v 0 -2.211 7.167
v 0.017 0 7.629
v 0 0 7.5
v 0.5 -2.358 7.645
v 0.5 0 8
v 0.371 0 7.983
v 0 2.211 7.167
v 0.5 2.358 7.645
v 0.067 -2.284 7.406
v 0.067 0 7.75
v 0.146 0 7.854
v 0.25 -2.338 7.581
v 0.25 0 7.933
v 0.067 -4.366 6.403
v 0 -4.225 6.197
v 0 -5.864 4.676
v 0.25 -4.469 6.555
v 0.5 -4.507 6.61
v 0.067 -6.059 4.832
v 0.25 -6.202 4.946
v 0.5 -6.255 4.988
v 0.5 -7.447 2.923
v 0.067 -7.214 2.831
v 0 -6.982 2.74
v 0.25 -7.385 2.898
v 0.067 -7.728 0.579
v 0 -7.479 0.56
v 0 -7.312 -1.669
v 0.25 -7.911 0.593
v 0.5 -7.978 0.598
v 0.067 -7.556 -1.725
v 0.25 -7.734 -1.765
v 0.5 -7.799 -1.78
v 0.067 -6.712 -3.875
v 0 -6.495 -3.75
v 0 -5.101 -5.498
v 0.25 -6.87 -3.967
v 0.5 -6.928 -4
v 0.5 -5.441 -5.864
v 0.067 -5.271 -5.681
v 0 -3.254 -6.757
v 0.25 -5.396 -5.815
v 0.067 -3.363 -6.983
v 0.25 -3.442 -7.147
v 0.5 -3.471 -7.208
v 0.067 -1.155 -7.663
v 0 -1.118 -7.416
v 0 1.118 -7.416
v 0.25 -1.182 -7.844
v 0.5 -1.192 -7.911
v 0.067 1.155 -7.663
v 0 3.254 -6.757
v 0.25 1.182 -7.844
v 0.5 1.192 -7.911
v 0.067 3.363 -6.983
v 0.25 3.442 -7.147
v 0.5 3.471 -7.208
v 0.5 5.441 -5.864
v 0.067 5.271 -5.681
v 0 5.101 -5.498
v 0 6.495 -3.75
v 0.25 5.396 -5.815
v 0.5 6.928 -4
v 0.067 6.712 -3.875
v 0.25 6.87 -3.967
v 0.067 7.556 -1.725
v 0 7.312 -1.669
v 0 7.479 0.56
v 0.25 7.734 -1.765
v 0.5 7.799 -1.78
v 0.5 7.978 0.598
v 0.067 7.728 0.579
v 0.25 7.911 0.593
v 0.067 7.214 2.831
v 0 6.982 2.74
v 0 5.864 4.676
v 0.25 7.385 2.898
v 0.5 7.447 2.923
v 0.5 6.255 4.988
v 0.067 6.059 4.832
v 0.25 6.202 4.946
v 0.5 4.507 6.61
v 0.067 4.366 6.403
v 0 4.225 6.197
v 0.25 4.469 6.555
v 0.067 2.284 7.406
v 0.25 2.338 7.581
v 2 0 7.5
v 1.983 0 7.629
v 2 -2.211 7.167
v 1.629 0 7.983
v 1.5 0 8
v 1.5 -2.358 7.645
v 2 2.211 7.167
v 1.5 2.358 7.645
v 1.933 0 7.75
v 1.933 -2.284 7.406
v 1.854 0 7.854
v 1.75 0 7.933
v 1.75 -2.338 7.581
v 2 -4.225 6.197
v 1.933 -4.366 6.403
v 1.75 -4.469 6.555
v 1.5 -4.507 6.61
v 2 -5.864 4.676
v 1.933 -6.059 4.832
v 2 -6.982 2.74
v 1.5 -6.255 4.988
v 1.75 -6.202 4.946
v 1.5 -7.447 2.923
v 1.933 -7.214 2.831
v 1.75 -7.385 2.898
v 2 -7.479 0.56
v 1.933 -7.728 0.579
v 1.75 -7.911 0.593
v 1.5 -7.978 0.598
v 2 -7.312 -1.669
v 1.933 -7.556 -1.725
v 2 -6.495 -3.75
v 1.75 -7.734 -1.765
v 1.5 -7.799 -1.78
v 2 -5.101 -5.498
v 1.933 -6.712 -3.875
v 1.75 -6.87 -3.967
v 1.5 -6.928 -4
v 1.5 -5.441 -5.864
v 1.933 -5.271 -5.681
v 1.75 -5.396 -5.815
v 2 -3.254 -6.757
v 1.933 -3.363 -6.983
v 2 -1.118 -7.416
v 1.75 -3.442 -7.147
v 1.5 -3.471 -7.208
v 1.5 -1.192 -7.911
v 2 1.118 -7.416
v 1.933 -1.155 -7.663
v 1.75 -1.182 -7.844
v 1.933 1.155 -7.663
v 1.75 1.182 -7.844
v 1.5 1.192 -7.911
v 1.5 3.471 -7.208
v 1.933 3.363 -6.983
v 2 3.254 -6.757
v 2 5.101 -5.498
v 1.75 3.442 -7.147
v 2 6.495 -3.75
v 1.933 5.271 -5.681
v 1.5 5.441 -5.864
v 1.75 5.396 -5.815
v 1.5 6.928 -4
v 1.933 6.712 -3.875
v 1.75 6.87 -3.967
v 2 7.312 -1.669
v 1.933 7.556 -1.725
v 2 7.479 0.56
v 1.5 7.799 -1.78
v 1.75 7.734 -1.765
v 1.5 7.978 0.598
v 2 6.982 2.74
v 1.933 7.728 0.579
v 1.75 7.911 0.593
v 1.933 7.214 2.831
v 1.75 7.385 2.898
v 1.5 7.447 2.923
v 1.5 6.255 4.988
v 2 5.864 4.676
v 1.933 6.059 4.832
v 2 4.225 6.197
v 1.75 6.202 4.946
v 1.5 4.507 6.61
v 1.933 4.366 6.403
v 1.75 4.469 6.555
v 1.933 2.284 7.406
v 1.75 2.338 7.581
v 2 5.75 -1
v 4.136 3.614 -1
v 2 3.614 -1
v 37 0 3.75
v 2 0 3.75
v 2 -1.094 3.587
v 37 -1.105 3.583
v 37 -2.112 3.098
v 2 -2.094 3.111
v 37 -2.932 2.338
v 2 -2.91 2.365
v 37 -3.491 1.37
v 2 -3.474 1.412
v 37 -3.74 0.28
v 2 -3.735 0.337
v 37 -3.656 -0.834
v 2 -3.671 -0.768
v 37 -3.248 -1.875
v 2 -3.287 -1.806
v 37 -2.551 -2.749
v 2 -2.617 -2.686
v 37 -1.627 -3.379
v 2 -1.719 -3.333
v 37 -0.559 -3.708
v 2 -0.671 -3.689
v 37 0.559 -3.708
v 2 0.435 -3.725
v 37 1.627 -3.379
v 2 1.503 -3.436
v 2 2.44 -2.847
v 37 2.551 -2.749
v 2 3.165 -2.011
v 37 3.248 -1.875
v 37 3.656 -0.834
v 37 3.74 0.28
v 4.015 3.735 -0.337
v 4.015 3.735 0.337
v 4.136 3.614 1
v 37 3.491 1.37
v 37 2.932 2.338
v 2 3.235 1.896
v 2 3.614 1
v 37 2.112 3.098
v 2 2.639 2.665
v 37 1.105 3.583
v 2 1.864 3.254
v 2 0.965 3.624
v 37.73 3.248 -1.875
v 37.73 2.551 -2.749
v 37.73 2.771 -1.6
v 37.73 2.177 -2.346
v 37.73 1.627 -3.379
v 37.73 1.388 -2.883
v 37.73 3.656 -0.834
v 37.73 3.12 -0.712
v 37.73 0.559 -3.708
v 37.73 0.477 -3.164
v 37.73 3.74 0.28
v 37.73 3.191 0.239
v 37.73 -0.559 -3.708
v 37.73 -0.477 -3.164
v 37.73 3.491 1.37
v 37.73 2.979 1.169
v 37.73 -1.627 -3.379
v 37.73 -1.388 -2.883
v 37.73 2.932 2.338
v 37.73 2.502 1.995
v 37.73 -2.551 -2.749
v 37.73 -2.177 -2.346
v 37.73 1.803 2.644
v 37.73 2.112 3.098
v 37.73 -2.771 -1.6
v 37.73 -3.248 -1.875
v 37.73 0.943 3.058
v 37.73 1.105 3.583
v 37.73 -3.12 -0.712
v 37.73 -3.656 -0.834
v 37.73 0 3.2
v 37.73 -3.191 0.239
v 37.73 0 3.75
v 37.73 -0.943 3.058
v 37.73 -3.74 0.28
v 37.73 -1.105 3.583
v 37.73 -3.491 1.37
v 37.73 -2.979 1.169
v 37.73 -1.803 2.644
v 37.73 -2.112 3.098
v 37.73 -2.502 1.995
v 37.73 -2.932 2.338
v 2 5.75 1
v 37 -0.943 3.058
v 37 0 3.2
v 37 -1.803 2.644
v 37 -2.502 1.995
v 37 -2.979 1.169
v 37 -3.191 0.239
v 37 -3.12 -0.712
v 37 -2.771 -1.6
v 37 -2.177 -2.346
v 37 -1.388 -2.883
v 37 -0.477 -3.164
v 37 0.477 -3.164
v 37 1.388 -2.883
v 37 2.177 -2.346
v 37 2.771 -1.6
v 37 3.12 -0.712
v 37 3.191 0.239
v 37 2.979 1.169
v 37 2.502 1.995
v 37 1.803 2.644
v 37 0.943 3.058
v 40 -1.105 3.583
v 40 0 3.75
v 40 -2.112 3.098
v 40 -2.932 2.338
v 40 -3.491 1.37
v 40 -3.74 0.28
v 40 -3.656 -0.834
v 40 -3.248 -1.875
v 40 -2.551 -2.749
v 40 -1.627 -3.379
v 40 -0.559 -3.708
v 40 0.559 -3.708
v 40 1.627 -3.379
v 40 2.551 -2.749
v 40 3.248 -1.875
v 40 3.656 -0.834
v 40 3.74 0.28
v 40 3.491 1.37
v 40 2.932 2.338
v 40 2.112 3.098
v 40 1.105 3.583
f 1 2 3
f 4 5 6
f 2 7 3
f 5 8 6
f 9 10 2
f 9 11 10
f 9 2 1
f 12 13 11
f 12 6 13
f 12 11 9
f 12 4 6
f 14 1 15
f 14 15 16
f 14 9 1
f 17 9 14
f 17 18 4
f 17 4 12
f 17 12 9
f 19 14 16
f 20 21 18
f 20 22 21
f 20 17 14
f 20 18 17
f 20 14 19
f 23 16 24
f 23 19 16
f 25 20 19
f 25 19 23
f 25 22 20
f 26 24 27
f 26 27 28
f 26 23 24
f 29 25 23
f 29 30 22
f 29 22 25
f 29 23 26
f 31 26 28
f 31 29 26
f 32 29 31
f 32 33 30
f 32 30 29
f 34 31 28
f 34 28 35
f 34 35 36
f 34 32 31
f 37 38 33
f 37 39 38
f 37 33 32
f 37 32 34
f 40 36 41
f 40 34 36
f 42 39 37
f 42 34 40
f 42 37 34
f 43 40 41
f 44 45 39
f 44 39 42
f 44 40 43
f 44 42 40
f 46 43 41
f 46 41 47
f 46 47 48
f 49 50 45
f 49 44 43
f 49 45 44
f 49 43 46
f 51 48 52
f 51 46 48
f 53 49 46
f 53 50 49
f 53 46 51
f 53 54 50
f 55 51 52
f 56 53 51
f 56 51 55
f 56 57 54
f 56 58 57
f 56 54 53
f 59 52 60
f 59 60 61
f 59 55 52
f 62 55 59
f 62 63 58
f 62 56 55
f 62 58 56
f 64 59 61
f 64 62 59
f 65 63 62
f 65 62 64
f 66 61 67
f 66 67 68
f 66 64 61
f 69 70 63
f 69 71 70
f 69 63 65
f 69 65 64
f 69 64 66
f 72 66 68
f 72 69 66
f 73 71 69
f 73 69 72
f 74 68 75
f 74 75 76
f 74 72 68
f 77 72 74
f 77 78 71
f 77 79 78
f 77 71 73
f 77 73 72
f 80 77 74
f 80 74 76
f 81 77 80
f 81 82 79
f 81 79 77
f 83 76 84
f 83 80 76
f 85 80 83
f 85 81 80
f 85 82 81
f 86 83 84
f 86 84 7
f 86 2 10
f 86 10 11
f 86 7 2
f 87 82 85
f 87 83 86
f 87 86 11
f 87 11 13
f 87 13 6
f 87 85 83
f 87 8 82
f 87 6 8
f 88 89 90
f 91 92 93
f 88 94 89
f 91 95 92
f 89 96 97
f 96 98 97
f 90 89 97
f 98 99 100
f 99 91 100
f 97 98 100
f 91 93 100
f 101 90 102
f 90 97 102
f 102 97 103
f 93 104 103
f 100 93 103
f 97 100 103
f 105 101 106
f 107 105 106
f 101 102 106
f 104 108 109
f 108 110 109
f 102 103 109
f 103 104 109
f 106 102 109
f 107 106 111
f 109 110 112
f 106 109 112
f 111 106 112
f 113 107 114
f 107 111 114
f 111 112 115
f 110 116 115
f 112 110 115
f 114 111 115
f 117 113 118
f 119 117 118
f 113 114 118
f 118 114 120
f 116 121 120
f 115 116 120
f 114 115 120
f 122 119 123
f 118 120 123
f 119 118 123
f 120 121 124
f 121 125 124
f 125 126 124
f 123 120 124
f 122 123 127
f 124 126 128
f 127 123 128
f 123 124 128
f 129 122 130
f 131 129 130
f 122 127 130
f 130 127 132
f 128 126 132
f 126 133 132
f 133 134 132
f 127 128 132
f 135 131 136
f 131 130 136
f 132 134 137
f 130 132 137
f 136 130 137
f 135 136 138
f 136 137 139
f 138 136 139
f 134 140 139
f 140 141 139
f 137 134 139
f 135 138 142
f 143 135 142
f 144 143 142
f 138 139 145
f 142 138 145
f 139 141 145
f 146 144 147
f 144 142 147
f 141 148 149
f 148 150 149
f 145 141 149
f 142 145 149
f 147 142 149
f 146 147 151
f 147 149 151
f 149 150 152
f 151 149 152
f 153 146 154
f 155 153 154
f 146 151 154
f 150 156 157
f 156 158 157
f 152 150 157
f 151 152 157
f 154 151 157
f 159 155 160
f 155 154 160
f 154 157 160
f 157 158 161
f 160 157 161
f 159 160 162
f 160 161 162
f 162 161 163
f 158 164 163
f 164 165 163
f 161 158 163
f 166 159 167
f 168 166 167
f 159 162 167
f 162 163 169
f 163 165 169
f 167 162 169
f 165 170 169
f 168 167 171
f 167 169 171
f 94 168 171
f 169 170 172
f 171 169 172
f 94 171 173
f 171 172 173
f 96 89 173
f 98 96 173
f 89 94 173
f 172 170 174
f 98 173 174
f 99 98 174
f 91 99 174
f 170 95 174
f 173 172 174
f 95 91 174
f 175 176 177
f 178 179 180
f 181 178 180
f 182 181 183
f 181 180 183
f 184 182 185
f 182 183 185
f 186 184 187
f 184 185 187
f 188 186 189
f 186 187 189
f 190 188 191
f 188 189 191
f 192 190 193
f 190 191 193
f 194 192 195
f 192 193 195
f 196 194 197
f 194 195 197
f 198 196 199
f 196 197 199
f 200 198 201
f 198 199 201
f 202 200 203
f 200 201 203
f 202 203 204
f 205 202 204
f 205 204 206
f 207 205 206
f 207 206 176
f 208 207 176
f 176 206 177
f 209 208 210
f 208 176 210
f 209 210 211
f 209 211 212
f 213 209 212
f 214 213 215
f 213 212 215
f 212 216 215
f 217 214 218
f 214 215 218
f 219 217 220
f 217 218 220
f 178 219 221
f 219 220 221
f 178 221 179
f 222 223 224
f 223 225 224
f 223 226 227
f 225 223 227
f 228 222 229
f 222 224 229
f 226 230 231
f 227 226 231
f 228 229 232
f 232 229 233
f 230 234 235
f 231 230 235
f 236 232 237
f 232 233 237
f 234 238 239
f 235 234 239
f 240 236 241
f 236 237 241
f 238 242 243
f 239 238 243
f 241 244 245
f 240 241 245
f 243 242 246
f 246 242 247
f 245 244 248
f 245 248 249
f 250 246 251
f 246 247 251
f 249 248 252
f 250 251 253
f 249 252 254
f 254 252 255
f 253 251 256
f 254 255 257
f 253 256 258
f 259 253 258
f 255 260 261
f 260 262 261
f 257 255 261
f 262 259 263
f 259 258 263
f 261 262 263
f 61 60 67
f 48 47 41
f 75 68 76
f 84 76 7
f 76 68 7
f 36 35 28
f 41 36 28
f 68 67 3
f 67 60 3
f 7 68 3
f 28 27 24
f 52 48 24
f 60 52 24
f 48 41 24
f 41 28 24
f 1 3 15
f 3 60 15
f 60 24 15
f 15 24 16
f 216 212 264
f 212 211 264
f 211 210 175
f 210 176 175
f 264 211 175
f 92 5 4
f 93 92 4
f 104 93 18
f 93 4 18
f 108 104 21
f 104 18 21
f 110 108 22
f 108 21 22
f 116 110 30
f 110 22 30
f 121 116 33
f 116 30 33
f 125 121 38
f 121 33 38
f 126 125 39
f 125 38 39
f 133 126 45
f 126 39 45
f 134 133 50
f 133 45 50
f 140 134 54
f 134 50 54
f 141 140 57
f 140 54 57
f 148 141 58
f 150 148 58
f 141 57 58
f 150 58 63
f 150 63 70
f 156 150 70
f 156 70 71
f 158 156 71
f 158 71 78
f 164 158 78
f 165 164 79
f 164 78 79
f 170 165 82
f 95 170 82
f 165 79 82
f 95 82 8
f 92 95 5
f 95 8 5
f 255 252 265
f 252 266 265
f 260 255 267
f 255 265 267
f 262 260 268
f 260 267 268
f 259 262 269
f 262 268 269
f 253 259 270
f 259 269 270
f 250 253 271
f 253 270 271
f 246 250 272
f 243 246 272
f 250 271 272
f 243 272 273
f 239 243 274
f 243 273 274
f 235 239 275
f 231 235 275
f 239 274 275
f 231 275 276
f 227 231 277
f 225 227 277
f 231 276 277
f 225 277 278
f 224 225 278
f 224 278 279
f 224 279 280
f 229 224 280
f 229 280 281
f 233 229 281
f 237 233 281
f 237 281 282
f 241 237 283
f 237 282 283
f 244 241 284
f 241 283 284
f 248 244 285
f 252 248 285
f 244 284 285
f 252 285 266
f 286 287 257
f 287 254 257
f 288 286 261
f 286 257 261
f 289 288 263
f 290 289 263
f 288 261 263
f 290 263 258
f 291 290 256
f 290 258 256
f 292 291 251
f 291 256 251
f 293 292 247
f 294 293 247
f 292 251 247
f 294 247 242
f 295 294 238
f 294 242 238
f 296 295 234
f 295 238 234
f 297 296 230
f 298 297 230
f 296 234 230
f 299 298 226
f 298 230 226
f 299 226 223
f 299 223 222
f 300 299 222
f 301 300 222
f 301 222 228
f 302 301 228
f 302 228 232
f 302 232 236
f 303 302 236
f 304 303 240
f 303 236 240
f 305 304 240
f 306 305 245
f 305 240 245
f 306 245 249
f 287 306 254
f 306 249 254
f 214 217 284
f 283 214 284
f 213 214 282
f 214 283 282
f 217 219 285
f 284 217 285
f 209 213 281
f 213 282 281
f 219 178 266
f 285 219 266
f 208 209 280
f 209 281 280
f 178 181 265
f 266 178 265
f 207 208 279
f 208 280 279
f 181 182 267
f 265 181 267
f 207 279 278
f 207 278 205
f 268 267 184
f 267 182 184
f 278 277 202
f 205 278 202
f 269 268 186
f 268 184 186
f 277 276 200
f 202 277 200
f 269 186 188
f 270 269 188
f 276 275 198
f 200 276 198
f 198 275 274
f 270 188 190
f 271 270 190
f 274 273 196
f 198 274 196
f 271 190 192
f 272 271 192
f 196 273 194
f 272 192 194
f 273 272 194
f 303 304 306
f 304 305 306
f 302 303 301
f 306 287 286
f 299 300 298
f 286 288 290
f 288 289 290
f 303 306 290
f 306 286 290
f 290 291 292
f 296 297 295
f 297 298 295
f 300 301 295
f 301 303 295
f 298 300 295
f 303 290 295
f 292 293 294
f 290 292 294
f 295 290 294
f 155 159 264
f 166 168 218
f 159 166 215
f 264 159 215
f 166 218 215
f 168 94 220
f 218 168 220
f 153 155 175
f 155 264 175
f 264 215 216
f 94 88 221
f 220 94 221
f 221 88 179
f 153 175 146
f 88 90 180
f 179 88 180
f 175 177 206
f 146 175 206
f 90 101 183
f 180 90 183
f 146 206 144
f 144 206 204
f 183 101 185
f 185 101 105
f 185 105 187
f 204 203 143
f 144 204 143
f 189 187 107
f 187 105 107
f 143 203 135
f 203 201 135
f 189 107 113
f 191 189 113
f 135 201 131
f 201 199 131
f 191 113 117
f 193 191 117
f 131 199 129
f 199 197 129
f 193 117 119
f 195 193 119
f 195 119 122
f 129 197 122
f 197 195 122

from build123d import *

# Parameters (mm, degrees)
FILLET1_R      = 0.5
RIB1_REACH     = 43.569
SKETCH2_WALL_W = 87.966865888
SKETCH2_WALL_H = 2


with BuildPart() as part:
    # Sketch1 → Revolve1 (revolve)
    with BuildSketch(Plane.XY, mode=Mode.PRIVATE) as revolve1_sk:
        Polygon((0, 8), (0, 0), (40, 0), (40, 3.75), (37.73, 3.75), (37.73, 3.2), (37, 3.2), (37, 3.75), (2, 3.75), (2, 8), align=None)
    revolve(revolve1_sk.sketch.rotate(Axis((0, 0, 0), (1, 0, 0)), 90), axis=Axis((0, 0, 0), (1, 0, 0)))

    # Fillet1
    fillet1_edges = [part.edges().sort_by_distance(p)[0] for p in [
        (0, 0, -8),
        (2, 0, -8),
    ]]
    fillet(fillet1_edges, radius=FILLET1_R)

    # Sketch2 wall → Rib1 (add, up to next)
    with BuildSketch(Plane(origin=(3, 4.75, 0), x_dir=(-0.707106781187, 0.707106781187, 0), z_dir=(-0.707106781187, -0.707106781187, 0)), mode=Mode.PRIVATE) as rib1_sk1:
        Rectangle(SKETCH2_WALL_W, SKETCH2_WALL_H)
    rib1_tool1 = extrude(rib1_sk1.sketch, amount=RIB1_REACH, mode=Mode.PRIVATE) - part.part
    add(rib1_tool1.solids().sort_by_distance((3, 4.75, 0))[0])


solid = part.part
